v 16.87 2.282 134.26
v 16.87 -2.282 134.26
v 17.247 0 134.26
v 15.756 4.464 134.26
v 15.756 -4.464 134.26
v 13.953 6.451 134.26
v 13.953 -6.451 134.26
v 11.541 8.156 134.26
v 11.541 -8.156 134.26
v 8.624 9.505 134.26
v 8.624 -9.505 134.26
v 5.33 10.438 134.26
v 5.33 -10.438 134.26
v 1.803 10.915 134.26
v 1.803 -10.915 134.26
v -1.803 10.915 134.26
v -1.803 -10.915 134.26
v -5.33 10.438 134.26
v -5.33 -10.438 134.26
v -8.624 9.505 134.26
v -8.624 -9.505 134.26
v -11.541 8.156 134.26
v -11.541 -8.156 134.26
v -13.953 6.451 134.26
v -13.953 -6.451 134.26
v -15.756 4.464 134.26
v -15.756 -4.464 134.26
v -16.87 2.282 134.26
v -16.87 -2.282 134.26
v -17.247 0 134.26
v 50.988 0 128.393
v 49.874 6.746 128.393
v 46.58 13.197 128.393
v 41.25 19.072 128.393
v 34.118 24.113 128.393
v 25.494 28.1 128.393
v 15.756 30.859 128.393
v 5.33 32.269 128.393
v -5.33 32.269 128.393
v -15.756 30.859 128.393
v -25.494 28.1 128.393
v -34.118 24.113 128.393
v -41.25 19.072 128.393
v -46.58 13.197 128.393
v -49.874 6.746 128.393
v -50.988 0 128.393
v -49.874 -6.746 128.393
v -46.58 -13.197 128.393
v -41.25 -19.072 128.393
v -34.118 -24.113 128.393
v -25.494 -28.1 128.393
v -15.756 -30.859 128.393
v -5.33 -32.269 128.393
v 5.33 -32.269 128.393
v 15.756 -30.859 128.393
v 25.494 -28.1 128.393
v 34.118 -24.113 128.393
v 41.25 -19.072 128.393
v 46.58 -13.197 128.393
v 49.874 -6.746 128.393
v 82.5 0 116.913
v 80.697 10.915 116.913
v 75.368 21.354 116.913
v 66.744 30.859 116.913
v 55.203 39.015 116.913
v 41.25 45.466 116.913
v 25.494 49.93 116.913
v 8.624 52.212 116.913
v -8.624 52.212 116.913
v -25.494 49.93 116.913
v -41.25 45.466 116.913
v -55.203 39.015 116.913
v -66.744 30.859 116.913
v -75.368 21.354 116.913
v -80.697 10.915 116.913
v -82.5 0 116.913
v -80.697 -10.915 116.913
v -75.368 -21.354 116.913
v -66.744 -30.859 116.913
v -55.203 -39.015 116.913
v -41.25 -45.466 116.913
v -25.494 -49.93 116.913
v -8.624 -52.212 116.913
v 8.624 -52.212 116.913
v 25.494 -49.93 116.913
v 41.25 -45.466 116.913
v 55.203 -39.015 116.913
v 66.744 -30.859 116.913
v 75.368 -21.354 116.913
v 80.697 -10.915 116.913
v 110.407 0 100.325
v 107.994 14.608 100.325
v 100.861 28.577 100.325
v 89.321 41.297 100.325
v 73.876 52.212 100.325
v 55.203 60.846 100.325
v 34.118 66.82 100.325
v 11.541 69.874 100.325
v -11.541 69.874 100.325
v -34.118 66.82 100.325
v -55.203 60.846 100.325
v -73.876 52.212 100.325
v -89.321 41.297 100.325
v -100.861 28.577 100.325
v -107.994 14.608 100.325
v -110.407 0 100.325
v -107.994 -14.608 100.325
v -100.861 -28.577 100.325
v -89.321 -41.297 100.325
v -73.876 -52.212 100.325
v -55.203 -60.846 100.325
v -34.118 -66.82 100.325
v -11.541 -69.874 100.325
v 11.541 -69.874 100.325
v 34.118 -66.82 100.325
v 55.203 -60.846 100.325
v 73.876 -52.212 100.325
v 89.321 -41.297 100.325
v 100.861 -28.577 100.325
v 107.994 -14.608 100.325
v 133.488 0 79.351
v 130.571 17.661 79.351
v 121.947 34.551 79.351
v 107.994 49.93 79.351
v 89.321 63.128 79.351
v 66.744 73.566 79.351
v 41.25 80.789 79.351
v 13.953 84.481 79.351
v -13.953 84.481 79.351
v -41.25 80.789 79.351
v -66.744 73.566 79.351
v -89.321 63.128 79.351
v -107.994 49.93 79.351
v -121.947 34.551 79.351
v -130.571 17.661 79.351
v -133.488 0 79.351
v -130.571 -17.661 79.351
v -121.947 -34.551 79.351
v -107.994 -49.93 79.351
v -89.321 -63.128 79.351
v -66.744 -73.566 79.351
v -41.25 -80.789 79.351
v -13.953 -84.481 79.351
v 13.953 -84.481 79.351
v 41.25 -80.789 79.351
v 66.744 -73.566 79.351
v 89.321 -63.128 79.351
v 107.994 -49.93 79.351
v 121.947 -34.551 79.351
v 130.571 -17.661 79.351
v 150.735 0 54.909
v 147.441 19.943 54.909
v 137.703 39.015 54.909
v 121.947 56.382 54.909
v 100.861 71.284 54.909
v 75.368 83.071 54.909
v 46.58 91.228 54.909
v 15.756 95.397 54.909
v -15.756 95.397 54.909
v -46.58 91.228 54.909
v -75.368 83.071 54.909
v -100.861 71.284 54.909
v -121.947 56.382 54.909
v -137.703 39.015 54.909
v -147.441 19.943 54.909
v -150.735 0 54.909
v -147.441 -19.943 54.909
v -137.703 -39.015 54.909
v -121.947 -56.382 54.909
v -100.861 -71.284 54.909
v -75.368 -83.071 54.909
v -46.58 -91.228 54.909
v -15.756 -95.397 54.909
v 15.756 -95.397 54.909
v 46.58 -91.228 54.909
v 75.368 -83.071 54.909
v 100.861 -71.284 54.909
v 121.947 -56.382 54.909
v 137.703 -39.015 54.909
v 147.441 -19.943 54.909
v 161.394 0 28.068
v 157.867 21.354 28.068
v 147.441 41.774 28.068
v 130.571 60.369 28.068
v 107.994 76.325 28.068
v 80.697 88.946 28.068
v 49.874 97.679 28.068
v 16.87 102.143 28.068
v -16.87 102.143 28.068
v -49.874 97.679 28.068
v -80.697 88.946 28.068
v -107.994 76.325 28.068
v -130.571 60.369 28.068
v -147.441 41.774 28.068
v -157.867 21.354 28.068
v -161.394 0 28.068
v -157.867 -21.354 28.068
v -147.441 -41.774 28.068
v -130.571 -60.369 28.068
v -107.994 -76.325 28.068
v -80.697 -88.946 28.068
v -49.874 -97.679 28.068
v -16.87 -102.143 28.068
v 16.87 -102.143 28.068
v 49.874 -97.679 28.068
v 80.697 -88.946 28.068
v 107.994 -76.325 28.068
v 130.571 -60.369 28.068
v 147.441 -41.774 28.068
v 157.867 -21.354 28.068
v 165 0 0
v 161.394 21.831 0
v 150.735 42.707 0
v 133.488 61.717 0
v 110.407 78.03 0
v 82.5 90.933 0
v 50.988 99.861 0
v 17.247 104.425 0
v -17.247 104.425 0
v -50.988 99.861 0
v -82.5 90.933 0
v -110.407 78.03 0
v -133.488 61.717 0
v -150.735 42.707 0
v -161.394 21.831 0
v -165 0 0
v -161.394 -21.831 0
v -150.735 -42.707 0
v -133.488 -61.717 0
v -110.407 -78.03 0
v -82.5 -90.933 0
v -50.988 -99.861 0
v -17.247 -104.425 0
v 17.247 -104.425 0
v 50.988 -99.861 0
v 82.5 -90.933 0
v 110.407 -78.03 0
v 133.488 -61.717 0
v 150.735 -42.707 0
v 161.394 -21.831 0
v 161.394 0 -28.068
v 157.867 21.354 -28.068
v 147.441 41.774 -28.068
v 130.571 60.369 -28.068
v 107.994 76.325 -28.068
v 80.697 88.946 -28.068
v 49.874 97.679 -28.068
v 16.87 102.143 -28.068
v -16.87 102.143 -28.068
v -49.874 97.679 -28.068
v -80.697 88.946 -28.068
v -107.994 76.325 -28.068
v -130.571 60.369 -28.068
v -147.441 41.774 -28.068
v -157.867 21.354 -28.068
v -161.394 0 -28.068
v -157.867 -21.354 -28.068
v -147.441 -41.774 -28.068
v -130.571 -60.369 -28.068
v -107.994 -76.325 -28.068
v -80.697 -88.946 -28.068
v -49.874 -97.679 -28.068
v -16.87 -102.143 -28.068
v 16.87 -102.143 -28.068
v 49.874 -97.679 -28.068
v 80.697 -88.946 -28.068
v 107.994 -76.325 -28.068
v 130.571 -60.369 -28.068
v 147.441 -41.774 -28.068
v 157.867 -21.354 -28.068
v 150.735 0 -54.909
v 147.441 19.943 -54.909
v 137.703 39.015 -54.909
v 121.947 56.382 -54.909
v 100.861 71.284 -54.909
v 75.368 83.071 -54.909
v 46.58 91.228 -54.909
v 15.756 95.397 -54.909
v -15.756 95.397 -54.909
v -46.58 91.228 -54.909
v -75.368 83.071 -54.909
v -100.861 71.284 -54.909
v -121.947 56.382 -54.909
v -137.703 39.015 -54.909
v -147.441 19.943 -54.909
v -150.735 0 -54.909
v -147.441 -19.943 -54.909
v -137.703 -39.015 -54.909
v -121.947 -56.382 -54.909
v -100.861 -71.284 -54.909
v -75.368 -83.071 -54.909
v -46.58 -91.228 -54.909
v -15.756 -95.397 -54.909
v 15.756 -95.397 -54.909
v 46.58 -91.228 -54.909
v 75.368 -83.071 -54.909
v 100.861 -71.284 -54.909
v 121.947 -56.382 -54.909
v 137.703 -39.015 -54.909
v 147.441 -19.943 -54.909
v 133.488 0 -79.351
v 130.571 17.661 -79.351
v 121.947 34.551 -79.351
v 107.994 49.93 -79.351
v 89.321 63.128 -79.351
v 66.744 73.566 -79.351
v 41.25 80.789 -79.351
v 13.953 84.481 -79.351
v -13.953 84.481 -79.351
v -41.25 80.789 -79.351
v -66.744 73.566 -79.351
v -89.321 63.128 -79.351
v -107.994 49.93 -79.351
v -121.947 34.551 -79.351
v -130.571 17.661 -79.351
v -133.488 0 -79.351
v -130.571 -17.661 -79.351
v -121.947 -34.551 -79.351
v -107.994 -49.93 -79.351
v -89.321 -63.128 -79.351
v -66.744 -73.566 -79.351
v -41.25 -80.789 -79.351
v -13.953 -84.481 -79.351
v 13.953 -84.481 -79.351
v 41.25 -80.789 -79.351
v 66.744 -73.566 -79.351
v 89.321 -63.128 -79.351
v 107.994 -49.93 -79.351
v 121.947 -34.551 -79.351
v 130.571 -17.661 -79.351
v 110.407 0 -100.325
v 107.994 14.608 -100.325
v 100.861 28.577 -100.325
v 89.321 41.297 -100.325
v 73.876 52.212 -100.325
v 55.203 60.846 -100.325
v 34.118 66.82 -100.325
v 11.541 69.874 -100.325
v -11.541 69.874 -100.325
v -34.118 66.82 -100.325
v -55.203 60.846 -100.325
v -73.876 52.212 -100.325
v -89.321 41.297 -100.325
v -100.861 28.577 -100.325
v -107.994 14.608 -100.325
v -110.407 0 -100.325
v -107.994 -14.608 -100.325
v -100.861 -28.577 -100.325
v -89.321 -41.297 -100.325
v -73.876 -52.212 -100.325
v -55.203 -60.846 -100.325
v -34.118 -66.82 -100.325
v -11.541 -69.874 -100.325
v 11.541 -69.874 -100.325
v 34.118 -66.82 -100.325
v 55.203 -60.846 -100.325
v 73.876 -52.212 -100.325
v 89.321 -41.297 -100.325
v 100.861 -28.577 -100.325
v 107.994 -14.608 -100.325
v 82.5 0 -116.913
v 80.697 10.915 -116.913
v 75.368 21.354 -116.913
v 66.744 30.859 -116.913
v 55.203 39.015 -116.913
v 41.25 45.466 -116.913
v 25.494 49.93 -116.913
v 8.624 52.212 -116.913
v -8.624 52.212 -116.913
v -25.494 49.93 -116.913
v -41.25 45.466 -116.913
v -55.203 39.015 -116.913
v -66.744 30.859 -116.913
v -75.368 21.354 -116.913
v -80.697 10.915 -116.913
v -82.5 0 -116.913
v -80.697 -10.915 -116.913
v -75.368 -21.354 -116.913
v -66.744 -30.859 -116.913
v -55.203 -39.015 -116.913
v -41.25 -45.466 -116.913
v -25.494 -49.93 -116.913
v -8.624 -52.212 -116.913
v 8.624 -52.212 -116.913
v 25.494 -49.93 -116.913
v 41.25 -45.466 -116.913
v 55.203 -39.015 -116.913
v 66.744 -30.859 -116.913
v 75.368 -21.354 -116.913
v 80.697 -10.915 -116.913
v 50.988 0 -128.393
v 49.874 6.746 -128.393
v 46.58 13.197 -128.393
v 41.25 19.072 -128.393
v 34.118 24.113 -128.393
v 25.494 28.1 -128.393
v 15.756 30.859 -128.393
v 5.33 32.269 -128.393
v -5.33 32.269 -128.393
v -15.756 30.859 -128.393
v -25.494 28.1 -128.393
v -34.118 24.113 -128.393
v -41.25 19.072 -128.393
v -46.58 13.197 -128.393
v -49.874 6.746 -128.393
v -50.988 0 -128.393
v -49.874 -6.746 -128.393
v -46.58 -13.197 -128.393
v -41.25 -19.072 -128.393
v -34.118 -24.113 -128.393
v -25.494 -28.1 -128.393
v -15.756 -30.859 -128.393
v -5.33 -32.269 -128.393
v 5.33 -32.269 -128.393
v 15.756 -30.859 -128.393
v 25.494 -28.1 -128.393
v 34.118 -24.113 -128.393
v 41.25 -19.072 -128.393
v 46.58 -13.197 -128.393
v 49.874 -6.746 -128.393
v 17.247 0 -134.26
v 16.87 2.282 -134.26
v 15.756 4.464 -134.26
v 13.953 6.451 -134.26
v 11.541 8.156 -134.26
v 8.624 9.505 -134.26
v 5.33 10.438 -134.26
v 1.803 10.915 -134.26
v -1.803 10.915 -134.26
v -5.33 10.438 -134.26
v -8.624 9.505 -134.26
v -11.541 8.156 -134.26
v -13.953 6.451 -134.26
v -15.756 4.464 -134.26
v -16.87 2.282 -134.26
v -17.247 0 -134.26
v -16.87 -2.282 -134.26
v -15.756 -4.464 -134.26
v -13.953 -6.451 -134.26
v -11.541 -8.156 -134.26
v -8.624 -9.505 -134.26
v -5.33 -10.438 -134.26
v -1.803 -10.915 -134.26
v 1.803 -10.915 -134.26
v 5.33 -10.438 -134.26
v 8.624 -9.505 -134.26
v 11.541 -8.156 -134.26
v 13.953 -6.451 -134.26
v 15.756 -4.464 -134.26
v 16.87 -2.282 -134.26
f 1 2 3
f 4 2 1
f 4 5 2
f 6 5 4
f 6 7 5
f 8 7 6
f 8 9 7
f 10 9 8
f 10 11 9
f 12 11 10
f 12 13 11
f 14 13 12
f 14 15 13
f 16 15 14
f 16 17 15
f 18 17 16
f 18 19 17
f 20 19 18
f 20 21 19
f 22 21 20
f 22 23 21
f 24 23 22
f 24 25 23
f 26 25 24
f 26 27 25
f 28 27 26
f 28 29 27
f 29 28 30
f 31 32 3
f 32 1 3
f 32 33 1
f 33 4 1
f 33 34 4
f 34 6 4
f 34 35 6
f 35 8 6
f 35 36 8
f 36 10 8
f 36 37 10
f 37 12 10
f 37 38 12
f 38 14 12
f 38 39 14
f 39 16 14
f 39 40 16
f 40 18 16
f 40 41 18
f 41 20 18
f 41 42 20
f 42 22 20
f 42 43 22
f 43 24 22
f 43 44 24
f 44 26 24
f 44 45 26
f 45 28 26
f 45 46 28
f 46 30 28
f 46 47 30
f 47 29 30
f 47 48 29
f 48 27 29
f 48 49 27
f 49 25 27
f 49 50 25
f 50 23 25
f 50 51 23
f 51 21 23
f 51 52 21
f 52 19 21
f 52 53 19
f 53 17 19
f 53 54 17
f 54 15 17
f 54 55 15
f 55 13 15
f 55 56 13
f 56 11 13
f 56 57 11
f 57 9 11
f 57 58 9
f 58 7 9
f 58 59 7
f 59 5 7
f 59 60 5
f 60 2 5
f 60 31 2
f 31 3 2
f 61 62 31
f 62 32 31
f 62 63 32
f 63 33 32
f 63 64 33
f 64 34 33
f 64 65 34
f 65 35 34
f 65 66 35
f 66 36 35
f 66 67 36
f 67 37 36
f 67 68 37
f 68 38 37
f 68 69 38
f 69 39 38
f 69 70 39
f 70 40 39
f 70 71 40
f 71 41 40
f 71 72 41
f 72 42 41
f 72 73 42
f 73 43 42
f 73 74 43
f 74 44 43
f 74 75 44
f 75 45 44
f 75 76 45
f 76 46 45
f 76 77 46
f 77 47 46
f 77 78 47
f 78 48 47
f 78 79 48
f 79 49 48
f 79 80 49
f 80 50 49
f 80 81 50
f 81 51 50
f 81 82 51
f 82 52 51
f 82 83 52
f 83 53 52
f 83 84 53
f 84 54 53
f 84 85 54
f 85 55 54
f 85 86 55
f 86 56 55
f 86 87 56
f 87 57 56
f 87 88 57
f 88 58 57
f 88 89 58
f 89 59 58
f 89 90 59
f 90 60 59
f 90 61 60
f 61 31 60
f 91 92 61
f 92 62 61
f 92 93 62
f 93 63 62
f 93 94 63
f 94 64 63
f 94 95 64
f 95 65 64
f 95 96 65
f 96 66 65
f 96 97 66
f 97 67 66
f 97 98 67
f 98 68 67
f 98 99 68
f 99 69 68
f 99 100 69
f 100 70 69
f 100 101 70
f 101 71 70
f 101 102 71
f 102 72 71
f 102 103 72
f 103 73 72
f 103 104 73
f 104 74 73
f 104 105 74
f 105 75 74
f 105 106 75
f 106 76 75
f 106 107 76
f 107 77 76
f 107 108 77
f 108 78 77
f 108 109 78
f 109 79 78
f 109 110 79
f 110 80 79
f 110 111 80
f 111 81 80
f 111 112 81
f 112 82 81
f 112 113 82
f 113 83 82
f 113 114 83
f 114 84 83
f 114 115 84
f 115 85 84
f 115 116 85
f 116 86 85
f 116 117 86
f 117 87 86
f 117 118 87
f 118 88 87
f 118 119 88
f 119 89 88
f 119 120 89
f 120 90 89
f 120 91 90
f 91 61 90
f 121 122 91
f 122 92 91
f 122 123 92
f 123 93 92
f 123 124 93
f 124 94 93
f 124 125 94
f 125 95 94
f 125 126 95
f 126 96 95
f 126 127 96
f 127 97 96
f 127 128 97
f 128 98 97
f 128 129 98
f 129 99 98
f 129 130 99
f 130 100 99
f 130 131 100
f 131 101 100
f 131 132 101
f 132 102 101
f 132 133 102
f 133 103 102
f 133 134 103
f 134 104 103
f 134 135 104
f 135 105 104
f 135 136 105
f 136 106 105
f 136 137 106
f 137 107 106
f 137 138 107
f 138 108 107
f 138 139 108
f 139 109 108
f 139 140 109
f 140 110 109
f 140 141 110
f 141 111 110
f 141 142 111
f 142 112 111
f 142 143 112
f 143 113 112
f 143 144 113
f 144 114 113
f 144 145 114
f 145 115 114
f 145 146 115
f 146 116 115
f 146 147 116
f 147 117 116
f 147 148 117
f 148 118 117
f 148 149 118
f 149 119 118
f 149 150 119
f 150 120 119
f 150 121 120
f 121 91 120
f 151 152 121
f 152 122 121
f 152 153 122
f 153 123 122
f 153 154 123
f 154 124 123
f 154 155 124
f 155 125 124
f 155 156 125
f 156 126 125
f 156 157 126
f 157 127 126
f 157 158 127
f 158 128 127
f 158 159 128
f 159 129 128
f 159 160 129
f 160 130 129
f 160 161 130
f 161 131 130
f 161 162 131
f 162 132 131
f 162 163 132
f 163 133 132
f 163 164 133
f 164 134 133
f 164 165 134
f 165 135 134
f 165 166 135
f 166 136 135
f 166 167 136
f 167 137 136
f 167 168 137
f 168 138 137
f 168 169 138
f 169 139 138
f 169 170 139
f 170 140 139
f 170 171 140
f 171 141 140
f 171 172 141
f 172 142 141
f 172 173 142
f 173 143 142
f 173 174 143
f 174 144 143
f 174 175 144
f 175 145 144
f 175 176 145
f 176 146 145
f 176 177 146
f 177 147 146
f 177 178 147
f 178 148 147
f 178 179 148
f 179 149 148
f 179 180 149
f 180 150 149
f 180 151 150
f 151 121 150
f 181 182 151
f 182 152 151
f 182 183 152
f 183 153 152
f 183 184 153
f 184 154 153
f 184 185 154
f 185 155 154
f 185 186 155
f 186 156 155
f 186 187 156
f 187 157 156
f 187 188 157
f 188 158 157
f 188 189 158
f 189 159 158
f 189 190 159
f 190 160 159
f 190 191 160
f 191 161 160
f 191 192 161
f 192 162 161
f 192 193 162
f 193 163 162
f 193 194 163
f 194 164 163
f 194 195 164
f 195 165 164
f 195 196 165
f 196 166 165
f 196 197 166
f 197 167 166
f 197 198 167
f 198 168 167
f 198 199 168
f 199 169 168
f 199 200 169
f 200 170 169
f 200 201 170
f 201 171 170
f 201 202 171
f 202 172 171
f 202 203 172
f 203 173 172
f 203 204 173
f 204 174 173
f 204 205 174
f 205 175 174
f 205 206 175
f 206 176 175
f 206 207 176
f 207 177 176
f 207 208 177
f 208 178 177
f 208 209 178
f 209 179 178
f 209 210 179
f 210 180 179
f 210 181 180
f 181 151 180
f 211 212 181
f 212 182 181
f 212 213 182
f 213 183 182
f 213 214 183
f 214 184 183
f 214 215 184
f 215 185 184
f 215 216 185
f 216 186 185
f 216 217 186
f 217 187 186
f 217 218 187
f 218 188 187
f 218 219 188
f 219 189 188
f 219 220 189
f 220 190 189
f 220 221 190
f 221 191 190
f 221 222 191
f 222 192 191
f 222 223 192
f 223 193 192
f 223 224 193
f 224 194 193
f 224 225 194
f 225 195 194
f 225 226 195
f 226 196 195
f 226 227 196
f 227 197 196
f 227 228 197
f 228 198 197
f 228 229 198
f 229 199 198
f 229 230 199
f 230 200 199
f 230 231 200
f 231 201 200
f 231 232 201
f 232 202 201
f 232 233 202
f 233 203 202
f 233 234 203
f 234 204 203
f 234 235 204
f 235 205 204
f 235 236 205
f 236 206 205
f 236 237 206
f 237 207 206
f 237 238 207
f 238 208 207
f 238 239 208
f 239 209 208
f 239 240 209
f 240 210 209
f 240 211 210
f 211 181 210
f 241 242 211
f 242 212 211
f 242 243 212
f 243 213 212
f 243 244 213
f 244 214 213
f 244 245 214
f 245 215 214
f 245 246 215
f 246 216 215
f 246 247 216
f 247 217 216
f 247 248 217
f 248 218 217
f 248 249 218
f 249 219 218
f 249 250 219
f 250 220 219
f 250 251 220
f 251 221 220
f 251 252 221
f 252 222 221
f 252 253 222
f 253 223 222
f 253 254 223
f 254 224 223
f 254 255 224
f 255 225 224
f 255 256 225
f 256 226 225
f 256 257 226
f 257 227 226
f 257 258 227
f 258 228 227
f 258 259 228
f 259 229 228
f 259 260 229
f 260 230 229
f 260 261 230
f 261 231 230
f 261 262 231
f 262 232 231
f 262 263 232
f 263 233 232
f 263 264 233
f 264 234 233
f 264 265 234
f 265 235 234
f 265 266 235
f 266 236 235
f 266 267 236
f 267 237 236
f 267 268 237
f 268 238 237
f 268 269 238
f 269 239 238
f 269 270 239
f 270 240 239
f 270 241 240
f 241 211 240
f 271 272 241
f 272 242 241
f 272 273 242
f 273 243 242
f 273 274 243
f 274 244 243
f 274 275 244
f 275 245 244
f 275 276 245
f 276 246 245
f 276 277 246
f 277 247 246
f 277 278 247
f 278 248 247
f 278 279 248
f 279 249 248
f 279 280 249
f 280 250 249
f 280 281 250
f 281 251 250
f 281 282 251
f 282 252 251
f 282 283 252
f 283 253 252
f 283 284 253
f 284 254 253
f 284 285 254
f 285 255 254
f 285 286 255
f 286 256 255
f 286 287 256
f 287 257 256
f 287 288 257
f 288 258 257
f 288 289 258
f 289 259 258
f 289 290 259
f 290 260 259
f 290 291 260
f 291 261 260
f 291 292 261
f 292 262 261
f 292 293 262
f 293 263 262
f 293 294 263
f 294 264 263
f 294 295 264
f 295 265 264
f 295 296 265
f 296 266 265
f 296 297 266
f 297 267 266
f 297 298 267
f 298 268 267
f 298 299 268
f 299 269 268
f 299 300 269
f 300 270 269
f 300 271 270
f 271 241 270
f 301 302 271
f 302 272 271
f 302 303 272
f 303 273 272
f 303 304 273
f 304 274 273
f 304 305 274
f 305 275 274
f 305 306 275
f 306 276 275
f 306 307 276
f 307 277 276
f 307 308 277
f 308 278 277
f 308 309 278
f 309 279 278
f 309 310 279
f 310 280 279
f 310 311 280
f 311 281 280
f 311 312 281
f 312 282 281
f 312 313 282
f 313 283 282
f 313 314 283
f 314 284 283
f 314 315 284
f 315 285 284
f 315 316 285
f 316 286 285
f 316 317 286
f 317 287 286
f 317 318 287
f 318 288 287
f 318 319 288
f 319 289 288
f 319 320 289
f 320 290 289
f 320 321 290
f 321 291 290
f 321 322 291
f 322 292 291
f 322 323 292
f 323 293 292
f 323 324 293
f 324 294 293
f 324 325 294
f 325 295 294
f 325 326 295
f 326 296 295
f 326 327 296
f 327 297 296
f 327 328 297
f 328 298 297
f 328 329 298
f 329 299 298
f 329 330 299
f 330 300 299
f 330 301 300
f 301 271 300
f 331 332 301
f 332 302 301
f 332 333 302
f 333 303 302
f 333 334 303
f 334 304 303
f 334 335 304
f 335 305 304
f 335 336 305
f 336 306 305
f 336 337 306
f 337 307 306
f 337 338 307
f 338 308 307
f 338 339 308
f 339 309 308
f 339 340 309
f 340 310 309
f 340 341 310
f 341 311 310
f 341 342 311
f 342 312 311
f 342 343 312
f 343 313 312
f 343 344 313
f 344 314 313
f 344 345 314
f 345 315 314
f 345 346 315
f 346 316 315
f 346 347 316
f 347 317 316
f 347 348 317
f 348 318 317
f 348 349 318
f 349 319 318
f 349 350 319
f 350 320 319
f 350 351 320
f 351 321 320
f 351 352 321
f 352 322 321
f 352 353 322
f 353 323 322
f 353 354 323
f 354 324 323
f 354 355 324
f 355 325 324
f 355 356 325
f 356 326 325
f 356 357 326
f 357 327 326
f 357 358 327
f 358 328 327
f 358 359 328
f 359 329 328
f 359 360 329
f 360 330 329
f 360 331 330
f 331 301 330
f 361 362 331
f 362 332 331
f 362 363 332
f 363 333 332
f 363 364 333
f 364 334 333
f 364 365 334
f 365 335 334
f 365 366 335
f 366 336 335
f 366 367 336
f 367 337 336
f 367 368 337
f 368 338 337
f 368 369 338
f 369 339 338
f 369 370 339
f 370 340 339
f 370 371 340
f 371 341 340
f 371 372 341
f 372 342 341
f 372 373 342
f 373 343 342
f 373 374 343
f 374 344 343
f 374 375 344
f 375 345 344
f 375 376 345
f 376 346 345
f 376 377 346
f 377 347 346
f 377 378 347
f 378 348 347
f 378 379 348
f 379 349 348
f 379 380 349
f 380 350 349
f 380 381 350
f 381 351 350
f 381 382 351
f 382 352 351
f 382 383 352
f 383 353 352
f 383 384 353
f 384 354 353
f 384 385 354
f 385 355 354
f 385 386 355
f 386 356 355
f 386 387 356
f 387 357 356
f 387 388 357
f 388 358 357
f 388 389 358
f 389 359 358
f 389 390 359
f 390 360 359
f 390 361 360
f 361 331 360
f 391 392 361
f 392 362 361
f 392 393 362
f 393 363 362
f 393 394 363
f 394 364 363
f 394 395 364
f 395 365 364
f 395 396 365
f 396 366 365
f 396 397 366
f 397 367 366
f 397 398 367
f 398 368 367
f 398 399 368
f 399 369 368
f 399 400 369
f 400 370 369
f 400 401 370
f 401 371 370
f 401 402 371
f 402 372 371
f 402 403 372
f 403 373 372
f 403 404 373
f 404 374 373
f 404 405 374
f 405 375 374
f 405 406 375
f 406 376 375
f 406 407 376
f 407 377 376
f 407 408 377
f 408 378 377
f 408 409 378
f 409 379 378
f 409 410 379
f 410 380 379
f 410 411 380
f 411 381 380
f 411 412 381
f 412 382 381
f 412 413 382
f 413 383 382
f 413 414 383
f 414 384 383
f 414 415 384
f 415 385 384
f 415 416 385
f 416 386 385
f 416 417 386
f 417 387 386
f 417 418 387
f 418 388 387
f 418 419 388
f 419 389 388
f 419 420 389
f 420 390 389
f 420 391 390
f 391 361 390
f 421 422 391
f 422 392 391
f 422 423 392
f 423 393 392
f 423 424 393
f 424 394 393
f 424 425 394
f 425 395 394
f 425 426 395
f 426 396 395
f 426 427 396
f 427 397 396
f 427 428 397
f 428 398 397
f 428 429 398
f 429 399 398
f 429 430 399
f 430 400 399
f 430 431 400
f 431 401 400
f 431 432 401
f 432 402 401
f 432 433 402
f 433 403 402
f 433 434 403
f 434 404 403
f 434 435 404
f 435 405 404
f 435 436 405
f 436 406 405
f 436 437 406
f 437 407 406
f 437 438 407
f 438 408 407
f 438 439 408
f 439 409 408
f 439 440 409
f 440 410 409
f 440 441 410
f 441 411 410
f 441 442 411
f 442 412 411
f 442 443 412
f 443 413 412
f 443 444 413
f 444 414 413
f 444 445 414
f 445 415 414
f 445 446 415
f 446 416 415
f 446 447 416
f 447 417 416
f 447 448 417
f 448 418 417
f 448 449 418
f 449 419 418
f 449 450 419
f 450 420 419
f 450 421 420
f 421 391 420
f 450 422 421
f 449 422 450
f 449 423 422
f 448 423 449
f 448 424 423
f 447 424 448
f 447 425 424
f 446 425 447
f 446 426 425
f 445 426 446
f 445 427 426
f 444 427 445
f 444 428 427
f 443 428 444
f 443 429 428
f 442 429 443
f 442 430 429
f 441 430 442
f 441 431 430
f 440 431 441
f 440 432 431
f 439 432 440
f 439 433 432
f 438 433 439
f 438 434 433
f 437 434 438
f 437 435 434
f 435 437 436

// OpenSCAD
// Generated by SolidPython 1.0.1 on 2020-07-29 00:46:49


scale(v = [11, 7, 9]) {
	sphere(r = 15);
}
/***********************************************
*********      SolidPython code:      **********
************************************************
 
# import packages: SolidPython
from solid import *
from solid.utils import *
from itertools import chain, combinations, permutations


class Resize:

    def __init__(self, scad_file):
        self.scad_file = scad_file
        #self.scad_file = import_scad(scad_file)
        # cone/cylinder param:
        self.r1 = 0
        self.r2 = 0
        self.h = 0
        # rectangular prism param:
        self.w = 0
        self.l = 0
        # ellipse param:
        self.r = 0

    # import OpenScad code (file name corresponds to shape)


    # classify shape + parameters
    def assign(self, param1, param2, param3):
        if self.scad_file == 'cone.scad':
            self.r1 = param1
            self.r2 = param2
            self.h = param3
        elif self.scad_file == 'cylinder.scad':
            self.r1 = param1
            self.r2 = param2
            self.h = param3
        elif self.scad_file == 'rectangularPrism.scad':
            self.h = param1
            self.l = param2
            self.w = param3
        else:
            self.r = param1
            self.h = param2

    # resize parameters
    def iterate(self):
        x = range(3, 20, 2)
        i = 1
        if self.scad_file == 'cone.scad':
            tempList = list(permutations(x, 2))
            for temp in tempList:
                param1 = temp[0]
                param2 = temp[1]
                filepath = 'produced_scad_files/' + 'cone' + str(param1) + '_' + str(param2) + '_' + '.scad'
                scad_render_to_file(cylinder(h=param1, r1=param2, r2=0), filepath)

        elif self.scad_file == 'cylinder.scad':
            tempList = list(permutations(x, 3))
            for temp in tempList:
                param1 = temp[0]
                param2 = temp[1]
                filepath = 'produced_scad_files/' + 'cylinder' + str(param1) + '_' + str(param2) + '_' + '.scad'
                scad_render_to_file(cylinder(h=param1, r1=param2, r2=param2), filepath)

        elif self.scad_file == 'rectangularPrism.scad':
            tempList = list(permutations(x, 3))
            for temp in tempList:
                param1 = temp[0]
                param2 = temp[1]
                param3 = temp[2]
                filepath = 'produced_scad_files/' + 'rectangularPrism' + str(param1) + '_' + str(param2) + '_' + str(
                    param3) + '.scad'
                scad_render_to_file(cube(size=(param1, param2, param3)), filepath)

        elif self.scad_file == 'ellipse.scad':
            tempList = list(permutations(x, 4))
            for temp in tempList:
                param1 = temp[0]
                param2 = temp[1]
                param3 = temp[2]
                param4 = temp[3]
                filepath = 'produced_scad_files/' + 'ellipse' + str(param1) + '_' + str(param2) + '_' + str(param3) + '_' + str(param4) + '.scad'
                scad_render_to_file(scale([param1, param2, param3])(sphere(r=param4)), filepath)

    def render_to_scadfile(self):
        scad_render_to_file(scad, 'example.scad') 
 
************************************************/
